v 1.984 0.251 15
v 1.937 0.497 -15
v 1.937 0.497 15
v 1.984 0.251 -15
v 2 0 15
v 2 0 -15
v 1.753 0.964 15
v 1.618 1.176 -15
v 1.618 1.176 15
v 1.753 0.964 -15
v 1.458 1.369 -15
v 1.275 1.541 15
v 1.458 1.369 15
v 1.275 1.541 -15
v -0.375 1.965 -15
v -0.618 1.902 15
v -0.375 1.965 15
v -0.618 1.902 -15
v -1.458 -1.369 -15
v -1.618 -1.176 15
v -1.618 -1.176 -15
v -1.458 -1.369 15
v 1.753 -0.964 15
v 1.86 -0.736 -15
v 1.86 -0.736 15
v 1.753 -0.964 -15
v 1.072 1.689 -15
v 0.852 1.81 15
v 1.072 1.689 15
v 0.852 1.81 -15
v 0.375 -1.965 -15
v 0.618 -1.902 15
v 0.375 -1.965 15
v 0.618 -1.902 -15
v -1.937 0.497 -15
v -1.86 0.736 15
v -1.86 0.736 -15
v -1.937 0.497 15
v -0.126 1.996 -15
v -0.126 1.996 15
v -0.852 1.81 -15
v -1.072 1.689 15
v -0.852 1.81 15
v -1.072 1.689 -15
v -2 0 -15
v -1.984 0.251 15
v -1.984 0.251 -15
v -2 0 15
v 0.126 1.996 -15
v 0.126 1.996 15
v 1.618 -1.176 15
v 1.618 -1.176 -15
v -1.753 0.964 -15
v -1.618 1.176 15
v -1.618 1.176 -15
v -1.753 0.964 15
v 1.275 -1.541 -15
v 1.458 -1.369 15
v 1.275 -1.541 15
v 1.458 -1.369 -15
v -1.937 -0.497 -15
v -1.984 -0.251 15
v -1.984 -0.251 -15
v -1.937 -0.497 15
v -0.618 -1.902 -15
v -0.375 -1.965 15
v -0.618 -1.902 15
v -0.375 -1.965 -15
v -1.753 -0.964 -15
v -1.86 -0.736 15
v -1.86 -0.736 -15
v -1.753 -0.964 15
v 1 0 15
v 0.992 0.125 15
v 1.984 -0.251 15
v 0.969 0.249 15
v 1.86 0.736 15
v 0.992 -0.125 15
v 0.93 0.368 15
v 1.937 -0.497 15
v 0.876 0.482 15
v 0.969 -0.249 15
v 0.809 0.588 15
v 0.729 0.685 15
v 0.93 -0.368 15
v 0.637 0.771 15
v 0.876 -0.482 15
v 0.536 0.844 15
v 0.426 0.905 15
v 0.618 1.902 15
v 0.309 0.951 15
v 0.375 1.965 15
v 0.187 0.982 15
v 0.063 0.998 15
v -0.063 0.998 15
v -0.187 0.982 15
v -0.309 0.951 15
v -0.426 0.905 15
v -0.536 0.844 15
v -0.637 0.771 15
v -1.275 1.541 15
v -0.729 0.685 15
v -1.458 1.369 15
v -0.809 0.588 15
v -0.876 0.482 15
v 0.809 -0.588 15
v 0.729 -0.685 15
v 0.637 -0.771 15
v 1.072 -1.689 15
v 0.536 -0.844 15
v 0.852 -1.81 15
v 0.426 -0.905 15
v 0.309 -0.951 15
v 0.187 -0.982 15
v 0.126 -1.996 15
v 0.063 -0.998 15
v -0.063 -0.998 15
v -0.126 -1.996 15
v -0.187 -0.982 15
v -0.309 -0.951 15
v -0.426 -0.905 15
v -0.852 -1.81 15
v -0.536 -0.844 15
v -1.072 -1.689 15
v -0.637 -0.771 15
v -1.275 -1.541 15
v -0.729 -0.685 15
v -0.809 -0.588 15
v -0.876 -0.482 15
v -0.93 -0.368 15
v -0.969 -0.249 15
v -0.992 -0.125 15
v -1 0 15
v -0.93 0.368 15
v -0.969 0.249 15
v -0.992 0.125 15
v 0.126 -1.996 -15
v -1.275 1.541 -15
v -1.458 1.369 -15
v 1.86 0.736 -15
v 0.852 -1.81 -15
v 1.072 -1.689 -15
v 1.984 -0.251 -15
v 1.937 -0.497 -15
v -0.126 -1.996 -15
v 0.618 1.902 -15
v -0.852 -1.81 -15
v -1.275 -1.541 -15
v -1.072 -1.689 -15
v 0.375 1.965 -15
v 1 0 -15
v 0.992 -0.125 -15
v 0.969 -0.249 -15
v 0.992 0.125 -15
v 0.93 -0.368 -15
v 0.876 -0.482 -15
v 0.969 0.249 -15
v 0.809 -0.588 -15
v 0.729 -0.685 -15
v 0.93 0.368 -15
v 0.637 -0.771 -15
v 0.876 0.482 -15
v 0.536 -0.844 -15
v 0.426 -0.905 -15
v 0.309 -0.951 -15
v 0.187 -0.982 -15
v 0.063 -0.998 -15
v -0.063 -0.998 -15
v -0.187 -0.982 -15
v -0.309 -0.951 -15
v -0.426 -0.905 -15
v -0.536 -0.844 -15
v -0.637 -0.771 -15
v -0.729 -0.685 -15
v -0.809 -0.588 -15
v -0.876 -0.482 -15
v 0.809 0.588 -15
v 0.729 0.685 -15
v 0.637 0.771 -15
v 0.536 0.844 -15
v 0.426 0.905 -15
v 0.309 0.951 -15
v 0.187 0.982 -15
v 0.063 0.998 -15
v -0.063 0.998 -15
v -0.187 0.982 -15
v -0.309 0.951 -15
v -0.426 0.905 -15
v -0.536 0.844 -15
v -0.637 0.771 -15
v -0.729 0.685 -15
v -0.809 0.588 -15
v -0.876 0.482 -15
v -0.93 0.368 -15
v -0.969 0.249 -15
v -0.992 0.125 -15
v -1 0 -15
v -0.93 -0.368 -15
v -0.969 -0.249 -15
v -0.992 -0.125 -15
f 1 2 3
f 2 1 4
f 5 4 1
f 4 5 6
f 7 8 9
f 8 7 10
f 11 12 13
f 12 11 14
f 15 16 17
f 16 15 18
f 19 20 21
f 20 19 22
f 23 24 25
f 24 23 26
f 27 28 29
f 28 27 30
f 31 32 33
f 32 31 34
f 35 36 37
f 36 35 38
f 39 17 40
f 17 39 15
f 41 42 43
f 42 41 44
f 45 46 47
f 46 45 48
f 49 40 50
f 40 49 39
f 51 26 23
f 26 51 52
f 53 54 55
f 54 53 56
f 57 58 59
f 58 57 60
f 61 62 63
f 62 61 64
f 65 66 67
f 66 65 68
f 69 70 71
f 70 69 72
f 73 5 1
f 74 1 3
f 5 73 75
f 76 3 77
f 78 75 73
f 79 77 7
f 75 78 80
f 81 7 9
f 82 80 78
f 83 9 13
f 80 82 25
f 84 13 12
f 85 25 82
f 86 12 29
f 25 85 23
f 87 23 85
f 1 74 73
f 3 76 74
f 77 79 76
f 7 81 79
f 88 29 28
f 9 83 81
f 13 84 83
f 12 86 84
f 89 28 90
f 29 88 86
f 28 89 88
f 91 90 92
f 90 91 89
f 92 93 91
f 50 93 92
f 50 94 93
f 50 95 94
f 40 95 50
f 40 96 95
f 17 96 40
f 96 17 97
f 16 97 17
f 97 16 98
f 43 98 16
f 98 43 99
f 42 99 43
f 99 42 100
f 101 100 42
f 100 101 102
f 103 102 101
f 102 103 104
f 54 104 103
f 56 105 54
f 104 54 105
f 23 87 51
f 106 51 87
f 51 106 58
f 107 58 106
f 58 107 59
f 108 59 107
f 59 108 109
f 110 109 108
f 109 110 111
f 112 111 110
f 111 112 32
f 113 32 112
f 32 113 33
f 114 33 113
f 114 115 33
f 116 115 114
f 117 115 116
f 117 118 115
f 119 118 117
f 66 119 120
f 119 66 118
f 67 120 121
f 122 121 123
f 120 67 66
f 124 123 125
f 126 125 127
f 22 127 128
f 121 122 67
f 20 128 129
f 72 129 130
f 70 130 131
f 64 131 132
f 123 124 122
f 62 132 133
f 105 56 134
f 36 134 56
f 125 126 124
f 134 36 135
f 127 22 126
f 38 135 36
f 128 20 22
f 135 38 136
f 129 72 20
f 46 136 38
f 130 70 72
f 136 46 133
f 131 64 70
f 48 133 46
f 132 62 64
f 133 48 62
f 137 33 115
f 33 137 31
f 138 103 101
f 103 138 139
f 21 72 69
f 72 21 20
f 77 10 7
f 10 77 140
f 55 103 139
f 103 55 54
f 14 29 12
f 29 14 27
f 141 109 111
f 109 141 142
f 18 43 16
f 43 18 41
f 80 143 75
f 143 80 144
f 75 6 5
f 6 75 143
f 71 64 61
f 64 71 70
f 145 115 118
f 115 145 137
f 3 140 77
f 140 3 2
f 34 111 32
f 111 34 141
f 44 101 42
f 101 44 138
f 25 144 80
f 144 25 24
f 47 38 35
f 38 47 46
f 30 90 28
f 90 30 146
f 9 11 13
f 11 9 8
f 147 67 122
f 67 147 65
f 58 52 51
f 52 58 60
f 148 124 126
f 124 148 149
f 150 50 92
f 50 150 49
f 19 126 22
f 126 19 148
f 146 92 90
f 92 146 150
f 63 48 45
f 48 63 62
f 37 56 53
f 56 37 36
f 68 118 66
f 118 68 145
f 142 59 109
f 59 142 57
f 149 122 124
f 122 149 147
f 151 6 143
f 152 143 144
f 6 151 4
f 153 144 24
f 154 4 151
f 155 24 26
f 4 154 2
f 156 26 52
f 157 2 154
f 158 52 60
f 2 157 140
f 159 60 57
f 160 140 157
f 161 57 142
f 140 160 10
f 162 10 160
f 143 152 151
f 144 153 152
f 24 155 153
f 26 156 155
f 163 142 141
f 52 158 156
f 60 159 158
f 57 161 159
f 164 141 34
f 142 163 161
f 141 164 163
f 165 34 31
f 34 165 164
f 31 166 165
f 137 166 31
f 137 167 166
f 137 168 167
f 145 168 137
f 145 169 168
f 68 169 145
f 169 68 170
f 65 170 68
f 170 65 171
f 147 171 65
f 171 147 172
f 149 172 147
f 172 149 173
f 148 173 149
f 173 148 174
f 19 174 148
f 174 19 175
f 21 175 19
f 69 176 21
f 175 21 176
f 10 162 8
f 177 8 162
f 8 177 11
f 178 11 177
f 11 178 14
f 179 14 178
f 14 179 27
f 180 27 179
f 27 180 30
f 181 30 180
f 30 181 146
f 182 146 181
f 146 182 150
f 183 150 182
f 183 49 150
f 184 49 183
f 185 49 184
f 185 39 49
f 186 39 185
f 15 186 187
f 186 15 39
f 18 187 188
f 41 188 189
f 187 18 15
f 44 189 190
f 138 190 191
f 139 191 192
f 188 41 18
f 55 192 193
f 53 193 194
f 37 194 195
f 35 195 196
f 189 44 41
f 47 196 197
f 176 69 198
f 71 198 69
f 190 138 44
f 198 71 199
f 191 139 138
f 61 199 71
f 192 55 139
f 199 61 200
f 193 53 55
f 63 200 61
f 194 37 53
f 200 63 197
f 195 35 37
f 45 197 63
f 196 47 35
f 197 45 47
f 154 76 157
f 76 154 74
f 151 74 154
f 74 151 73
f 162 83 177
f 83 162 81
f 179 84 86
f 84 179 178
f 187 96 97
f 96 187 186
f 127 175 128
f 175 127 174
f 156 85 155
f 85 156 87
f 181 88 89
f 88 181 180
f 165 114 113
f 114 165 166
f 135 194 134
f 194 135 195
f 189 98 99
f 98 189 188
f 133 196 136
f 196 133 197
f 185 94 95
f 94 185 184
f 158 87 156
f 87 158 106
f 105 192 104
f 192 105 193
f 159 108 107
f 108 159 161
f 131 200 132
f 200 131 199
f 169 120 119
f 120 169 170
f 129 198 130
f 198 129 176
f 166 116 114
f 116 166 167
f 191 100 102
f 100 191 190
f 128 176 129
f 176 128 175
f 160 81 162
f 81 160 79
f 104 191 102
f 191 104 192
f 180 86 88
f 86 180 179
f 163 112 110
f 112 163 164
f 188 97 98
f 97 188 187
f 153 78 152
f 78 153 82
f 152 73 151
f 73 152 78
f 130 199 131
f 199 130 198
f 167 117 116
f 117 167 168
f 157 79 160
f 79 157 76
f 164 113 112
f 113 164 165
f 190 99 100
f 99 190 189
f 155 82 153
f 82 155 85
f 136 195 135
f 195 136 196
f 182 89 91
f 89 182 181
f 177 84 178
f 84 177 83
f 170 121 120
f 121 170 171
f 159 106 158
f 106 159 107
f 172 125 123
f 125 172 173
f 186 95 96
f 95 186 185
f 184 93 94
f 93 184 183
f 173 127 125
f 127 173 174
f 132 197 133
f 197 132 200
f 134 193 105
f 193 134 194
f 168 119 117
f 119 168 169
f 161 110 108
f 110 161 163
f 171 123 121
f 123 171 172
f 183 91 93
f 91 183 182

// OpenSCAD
$fn = 50;


difference() {
	union() {
		translate(v = [0, 0, -15.0000000000]) {
			cylinder(h = 30, r = 2.0000000000);
		}
	}
	union() {
		translate(v = [0, 0, -100.0000000000]) {
			cylinder(h = 200, r = 1.0000000000);
		}
	}
}
